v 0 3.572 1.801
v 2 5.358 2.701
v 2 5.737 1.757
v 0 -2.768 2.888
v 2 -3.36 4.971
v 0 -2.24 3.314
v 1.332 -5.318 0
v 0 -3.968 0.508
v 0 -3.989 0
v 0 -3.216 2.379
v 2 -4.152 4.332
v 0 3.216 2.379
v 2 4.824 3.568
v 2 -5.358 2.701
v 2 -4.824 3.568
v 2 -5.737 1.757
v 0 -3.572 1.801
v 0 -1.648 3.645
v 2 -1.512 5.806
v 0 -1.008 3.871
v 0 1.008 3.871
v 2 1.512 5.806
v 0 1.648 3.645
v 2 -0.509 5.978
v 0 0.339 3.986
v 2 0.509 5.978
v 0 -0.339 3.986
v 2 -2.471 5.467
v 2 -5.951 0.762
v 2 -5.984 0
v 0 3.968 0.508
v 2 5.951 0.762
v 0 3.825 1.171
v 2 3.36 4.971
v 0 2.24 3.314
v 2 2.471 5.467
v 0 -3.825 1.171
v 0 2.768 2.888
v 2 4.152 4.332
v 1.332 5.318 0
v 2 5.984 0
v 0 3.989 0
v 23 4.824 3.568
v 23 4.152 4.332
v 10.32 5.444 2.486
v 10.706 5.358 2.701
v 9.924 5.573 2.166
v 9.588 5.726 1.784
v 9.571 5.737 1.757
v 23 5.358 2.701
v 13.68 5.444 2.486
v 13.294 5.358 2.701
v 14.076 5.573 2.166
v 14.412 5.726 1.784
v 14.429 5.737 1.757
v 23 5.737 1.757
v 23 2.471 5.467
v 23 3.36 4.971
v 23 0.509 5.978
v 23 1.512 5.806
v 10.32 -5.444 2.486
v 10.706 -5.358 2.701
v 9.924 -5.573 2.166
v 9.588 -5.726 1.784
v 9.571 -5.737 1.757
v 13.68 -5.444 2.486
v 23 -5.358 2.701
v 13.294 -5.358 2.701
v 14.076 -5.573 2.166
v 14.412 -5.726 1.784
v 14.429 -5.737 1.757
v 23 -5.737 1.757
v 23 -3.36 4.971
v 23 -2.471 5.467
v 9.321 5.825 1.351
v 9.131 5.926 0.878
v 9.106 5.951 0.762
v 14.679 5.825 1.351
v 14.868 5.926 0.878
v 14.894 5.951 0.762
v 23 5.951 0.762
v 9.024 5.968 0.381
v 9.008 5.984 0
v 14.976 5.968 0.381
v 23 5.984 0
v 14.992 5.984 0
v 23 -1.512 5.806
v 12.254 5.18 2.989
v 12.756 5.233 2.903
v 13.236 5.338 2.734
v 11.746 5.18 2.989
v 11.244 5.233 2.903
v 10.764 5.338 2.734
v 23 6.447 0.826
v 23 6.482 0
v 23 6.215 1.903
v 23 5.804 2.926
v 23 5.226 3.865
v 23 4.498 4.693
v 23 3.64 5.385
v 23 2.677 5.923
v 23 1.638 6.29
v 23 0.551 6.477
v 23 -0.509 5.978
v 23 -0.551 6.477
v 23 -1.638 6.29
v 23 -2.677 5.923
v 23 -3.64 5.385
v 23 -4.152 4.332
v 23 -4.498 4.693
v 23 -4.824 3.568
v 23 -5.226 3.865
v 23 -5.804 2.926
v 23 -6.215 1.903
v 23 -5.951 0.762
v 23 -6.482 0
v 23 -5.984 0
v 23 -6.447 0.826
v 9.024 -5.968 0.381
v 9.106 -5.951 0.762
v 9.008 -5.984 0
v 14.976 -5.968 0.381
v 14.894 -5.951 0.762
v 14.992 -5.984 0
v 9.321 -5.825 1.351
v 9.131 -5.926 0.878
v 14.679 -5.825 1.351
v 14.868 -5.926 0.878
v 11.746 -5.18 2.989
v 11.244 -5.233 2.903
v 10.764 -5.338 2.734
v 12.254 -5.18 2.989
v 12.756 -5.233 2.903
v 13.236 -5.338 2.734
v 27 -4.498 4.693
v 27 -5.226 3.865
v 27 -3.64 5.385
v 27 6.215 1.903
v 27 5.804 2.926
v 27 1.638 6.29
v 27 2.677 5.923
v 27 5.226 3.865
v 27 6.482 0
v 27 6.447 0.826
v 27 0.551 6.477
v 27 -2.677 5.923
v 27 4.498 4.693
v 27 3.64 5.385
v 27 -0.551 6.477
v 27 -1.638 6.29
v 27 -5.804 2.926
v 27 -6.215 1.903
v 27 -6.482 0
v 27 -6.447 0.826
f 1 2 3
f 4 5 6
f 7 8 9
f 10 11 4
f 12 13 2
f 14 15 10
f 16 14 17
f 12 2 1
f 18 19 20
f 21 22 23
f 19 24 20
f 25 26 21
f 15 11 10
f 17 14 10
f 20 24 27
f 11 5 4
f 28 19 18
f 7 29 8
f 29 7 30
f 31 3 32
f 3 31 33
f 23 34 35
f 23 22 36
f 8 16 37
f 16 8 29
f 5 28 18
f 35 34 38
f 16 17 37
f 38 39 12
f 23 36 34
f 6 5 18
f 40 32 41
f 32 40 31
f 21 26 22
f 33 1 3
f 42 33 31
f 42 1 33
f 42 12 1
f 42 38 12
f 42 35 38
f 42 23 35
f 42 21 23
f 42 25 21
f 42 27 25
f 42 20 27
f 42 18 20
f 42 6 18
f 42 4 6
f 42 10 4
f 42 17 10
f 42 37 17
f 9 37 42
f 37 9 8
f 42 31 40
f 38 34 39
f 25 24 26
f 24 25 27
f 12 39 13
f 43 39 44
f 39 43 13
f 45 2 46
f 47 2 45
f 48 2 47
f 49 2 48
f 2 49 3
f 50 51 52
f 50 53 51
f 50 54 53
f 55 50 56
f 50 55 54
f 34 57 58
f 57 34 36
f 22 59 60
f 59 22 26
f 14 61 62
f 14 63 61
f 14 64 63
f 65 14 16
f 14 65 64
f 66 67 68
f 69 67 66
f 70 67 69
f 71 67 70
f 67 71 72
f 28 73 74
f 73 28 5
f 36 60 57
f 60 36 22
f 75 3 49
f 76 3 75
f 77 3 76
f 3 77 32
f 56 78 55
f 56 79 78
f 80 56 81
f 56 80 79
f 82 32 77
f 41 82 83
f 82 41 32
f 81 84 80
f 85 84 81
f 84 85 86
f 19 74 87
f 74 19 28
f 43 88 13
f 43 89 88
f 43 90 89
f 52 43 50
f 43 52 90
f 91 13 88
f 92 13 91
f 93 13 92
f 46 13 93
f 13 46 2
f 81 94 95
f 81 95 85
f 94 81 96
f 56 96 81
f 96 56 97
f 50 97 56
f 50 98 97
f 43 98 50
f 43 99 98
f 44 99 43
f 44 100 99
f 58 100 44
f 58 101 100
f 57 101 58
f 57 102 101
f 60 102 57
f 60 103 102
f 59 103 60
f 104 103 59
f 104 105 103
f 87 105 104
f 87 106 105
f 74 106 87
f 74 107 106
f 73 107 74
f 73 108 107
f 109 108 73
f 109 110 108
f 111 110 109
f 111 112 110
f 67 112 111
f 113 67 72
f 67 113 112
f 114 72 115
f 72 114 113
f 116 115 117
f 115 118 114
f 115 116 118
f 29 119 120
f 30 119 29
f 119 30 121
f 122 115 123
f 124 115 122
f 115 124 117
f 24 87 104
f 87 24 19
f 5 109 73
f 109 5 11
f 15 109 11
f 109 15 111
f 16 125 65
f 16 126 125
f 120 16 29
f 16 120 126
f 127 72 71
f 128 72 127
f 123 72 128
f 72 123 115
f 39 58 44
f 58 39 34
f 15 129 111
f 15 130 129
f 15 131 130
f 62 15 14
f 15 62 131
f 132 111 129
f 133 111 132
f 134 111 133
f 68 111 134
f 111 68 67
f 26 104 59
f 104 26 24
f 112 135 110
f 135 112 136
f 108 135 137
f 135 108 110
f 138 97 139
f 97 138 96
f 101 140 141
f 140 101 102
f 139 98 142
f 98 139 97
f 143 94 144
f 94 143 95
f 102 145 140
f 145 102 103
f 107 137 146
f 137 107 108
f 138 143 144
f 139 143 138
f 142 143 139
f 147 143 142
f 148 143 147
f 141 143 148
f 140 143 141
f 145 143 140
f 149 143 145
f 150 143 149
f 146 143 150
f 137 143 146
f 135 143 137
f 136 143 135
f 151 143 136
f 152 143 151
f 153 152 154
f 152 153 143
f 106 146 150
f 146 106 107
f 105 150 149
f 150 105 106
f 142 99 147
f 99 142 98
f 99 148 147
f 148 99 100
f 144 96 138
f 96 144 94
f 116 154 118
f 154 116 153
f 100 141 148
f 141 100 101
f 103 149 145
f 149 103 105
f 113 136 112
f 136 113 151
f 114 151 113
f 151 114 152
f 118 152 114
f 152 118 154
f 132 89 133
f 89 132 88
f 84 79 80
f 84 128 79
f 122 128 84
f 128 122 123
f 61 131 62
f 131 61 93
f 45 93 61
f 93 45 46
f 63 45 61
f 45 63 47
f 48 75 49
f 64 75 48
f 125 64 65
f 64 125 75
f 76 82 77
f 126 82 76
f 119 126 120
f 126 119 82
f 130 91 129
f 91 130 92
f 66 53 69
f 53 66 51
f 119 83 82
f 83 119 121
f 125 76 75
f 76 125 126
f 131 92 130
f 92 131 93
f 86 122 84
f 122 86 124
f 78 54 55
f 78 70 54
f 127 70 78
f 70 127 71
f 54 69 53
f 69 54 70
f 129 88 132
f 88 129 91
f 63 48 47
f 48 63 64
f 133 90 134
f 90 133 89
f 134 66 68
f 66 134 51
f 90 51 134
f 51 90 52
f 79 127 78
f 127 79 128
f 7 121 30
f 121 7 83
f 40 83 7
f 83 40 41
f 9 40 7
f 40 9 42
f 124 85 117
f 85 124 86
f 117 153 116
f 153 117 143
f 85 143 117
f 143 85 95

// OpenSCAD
///Split the object in two so that you can clamp them later
split = true;
///Rotates the print flat down with value 1, or some other funnier direction with other numbers
rotate_down = 1;
///Hole diameter
hole = 6;
///Shaft diameter
shaft = 12;
///Diameter of the thicker part in the end of the shaft
shaft_end = 13;
///Lenght of the shaft part (the thicker part is excluded)
shaft_lenght = 21;
///Lenght of the thicker part
shaft_end_lenght = 4;
///Distance of the hole from the end of shaft part
hole_distance = 10;
///Lenghtwise angle. Remember to switch -+ for the other half
lenghtwise_angle = 0;
///Sideways angle. Remember to switch -+ for the other half
sideways_angle = 0;
///Coned end, to guide the peg
guide_lenght = 2;
///Guide end diameter
guide = 8;

holer = hole / 2;
shaftr = shaft / 2;
shaft_endr = shaft_end / 2;
guider = guide / 2;
$fn = 2 * PI * shaftr;  //Render-accuracy

module peg()
{
    union()
    {
        cylinder(r1 = guider, r2 = shaftr, h = guide_lenght);
        translate([0,0,guide_lenght])cylinder(r = shaftr, h = shaft_lenght);
        translate([0,0,guide_lenght + shaft_lenght]){cylinder(r = shaft_endr, h = shaft_end_lenght);}
    }
}

module peg_with_hole()
{
    difference()
    {
        peg();
        rotate([90-lenghtwise_angle,0,sideways_angle])translate([0,shaft,-hole_distance]){cylinder(r = holer, h = 1000);}
    }
}

module thing()
{
    rotate([0,90*rotate_down,0])
    {
        difference()
        {
            peg_with_hole();
            if (split)
                translate([0,-500,-0]){cube([1000,1000,1000]);}
        }
    }
}

thing();
